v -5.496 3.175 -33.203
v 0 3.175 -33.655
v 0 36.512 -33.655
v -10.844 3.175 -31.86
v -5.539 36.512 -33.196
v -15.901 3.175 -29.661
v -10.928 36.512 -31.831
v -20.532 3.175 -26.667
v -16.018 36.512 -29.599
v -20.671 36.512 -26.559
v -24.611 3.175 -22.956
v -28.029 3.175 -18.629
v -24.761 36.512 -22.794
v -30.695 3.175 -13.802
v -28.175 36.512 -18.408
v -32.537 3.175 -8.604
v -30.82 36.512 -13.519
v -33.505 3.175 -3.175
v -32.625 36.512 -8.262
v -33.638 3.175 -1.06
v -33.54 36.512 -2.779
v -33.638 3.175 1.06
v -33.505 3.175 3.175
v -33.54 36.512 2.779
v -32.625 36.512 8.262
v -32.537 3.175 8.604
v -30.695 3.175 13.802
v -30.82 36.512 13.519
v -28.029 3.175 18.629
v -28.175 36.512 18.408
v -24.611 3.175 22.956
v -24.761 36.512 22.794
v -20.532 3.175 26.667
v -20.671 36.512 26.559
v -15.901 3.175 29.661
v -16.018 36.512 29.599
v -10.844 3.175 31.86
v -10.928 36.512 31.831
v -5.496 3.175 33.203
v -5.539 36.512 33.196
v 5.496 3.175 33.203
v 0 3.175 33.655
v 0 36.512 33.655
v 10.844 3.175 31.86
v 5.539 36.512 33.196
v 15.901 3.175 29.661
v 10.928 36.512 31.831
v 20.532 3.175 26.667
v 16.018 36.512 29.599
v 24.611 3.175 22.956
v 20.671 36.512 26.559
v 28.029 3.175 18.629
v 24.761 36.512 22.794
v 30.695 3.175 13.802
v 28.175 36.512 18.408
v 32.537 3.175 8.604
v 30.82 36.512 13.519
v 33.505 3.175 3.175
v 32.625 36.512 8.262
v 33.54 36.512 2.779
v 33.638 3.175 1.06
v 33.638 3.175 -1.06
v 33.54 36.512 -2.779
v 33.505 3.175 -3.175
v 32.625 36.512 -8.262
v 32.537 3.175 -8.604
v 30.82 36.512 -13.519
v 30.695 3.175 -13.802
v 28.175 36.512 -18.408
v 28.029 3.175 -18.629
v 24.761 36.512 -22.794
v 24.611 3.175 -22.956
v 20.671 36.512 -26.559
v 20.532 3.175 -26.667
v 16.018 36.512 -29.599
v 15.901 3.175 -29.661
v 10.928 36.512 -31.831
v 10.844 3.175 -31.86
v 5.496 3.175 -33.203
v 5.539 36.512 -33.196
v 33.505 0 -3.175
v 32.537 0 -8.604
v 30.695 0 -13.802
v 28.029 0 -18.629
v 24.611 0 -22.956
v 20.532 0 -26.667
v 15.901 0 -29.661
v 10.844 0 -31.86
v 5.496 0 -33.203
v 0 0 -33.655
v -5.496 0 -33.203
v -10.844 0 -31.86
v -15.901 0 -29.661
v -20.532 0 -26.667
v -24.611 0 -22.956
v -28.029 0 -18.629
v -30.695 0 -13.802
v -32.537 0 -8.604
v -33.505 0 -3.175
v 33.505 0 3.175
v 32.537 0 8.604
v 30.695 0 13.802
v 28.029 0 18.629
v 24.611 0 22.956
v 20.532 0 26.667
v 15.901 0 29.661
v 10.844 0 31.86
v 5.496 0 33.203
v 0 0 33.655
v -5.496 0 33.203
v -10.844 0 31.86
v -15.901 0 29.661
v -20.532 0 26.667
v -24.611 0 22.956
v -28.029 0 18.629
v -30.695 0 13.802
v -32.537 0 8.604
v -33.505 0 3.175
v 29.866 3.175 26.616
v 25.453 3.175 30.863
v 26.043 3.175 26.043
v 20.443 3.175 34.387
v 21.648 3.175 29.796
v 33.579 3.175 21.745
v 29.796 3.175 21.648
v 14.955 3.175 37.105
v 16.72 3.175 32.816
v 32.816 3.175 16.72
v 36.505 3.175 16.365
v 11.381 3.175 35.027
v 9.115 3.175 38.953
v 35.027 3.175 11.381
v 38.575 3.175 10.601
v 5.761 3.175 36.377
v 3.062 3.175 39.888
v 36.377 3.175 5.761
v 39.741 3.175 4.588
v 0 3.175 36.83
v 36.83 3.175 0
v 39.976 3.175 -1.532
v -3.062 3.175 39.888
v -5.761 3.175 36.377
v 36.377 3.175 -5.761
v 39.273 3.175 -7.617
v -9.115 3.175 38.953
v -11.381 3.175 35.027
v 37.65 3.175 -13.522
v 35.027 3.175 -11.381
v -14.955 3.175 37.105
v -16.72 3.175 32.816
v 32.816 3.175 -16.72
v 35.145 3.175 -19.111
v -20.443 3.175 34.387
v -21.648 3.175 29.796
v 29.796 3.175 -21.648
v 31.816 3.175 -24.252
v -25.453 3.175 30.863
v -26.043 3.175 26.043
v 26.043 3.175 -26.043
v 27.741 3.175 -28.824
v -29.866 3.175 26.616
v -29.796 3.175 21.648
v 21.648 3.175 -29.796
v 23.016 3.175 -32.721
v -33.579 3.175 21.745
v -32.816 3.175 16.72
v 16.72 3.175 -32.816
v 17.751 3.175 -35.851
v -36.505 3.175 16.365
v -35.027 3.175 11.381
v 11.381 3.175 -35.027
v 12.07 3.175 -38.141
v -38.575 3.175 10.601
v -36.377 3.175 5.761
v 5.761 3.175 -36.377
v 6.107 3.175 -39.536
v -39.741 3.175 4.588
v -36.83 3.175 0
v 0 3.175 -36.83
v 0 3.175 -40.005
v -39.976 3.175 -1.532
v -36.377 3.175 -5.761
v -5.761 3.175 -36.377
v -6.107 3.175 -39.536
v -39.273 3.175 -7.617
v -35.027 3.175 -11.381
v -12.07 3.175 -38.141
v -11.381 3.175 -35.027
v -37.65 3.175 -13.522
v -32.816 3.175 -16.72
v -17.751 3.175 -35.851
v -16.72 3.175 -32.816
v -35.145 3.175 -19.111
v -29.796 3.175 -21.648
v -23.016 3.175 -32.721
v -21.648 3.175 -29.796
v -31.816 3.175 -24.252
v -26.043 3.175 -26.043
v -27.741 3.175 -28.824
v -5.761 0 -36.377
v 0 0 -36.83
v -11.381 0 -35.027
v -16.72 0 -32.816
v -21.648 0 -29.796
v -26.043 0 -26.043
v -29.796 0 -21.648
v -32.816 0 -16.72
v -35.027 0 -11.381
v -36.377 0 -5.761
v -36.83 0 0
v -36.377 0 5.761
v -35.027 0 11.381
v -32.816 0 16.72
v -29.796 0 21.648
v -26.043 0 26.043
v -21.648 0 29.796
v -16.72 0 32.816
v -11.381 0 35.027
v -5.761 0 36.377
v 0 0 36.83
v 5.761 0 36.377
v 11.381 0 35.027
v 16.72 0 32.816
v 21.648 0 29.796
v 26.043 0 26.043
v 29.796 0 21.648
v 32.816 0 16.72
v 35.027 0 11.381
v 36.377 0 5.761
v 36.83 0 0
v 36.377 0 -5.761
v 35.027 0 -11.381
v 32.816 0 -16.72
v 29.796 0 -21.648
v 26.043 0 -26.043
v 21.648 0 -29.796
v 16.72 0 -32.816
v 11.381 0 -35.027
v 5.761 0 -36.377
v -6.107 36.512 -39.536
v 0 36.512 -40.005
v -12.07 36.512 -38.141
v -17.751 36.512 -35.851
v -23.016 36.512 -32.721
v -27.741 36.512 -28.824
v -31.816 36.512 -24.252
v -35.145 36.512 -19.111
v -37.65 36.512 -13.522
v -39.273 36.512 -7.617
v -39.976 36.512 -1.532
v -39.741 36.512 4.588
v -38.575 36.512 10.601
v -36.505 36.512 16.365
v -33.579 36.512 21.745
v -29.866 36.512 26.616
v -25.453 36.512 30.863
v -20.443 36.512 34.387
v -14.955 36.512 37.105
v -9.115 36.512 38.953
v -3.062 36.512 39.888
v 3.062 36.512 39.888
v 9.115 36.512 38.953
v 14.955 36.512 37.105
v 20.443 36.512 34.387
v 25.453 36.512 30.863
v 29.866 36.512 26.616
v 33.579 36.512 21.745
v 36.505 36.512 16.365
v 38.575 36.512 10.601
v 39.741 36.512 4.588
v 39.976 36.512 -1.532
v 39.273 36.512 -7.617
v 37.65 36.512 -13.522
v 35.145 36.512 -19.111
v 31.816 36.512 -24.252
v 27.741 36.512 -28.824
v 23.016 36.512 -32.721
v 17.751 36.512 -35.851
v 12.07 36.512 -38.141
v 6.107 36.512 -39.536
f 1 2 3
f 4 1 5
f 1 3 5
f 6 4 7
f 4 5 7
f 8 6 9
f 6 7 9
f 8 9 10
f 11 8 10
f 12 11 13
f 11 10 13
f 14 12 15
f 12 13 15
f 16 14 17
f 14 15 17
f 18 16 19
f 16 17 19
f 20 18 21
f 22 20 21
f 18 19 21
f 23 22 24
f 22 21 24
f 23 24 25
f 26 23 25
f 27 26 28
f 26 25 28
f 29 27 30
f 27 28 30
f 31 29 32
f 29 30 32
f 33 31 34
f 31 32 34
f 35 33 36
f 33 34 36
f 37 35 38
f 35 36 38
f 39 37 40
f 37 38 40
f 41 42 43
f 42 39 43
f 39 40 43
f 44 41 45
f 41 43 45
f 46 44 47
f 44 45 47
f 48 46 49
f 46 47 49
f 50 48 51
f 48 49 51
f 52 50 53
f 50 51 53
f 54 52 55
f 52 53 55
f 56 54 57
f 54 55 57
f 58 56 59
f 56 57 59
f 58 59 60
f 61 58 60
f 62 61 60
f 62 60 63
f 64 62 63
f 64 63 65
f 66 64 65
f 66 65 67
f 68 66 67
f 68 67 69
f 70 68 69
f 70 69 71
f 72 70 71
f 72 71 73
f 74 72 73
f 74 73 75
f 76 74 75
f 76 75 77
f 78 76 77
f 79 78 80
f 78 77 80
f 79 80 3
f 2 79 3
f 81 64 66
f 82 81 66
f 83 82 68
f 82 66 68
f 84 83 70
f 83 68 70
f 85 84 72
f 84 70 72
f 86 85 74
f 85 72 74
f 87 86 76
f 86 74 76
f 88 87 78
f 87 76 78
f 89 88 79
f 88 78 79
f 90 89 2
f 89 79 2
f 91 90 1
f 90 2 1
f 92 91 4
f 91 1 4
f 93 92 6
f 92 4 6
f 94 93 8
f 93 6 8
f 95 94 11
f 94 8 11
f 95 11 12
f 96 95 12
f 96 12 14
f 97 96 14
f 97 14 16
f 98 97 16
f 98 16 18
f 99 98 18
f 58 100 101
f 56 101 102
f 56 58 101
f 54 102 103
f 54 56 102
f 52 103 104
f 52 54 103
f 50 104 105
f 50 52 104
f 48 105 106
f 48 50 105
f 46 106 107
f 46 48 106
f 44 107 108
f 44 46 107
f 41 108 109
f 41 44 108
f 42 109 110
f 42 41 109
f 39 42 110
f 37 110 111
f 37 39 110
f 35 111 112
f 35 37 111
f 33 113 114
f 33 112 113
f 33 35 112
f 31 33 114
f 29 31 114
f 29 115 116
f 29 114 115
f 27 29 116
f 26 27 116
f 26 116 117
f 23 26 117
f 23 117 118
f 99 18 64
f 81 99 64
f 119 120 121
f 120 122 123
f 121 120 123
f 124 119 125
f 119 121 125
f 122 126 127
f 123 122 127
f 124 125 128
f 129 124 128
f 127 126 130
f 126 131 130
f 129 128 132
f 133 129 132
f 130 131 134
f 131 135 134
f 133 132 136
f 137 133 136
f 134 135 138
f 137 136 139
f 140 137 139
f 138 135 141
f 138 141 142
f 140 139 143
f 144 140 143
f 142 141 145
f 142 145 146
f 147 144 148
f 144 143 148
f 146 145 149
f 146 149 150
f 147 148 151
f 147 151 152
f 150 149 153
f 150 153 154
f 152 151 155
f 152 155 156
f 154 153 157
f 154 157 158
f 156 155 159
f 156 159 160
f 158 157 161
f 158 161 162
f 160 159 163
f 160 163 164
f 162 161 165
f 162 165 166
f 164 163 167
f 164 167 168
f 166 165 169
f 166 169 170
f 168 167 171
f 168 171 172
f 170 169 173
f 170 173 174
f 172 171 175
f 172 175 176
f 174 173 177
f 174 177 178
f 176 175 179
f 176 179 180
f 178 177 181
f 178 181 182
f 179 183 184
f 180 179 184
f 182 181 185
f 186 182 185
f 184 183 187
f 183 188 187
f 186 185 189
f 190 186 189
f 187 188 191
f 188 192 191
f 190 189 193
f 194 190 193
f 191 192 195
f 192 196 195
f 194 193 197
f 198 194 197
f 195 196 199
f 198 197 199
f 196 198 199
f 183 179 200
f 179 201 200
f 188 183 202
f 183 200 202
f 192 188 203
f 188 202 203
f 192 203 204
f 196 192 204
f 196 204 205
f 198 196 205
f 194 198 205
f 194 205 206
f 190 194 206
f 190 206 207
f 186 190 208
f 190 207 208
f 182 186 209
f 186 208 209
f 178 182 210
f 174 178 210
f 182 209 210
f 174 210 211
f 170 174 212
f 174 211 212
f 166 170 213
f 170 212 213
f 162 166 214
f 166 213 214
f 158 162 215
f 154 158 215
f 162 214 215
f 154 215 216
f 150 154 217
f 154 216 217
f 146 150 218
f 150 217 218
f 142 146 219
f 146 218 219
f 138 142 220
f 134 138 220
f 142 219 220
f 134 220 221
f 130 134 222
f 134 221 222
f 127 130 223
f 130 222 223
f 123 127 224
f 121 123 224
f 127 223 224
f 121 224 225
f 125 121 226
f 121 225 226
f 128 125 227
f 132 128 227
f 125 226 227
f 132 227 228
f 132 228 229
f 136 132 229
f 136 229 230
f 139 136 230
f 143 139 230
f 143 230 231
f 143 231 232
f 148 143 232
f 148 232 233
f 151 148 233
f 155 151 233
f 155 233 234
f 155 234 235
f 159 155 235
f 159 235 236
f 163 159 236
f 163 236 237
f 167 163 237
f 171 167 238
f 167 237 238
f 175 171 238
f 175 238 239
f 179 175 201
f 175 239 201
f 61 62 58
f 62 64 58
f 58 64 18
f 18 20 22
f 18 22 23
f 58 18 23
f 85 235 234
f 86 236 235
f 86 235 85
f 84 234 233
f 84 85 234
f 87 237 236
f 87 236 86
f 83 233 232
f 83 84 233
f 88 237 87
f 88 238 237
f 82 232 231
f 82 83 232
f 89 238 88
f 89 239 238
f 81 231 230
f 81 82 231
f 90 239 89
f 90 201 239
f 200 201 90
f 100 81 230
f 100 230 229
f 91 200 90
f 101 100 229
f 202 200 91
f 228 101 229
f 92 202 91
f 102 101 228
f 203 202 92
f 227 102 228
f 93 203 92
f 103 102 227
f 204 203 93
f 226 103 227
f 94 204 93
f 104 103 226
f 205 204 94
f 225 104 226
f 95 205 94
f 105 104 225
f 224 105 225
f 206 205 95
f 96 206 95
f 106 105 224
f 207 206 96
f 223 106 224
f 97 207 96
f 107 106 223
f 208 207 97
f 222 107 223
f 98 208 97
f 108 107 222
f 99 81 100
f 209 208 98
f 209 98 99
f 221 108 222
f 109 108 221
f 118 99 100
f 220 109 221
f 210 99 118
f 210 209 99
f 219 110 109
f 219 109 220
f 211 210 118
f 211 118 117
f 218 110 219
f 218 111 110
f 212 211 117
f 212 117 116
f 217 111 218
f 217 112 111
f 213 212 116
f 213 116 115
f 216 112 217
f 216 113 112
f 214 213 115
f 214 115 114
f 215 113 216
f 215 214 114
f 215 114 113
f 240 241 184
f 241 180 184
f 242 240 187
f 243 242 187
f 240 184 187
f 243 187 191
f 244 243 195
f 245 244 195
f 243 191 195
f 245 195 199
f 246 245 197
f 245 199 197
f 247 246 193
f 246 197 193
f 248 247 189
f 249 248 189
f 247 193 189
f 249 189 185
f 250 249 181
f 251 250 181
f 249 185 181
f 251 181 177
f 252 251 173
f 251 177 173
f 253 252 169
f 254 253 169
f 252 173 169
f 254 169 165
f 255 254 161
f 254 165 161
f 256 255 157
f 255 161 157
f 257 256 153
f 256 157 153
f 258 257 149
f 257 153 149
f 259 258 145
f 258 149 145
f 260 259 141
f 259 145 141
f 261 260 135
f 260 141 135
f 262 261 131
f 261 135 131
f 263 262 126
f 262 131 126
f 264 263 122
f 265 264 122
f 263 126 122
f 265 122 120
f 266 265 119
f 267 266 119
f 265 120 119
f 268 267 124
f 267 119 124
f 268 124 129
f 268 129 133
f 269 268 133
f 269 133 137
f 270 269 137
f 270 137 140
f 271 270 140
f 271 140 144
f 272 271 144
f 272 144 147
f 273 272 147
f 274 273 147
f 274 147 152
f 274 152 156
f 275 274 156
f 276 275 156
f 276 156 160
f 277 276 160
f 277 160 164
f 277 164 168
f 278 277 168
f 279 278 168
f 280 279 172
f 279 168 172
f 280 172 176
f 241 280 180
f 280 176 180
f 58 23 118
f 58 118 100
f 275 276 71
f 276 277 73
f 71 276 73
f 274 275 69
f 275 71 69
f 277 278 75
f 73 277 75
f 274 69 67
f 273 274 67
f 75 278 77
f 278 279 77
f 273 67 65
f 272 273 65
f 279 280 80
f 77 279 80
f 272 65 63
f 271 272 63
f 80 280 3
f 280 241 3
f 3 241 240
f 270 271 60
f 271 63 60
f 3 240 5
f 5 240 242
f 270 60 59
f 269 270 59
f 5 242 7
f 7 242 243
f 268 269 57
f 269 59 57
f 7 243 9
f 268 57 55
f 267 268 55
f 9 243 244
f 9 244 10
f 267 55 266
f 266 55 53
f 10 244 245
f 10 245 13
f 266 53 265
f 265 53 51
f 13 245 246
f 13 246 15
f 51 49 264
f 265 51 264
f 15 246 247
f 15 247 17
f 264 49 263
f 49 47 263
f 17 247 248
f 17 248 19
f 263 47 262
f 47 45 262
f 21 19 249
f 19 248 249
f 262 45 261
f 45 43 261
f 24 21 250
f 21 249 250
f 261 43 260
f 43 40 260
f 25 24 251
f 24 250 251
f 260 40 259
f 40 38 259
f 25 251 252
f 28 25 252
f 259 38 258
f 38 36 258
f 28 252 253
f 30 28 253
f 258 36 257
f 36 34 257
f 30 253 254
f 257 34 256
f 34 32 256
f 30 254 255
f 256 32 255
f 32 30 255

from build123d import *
from build123d.topology import SkipClean

# Parameters (mm, degrees)
CUT_EXTRUDE1_DEPTH = 66.667259393


with BuildPart() as part:
    # Sketch1 → Revolve1 (revolve)
    with BuildSketch(Plane.XY, mode=Mode.PRIVATE) as revolve1_sk:
        Polygon((33.655, 36.5125), (40.005, 36.5125), (40.005, 3.175), (36.83, 3.175), (36.83, 0), (33.655, 0), (0, 0), (0, 3.175), (33.655, 3.175), align=None)
    revolve(revolve1_sk.sketch.rotate(Axis((0, 0, 0), (0, 1, 0)), 90), axis=Axis((0, 0, 0), (0, 1, 0)))

    # Sketch2 → Cut-Extrude1 (cut, through all)
    with SkipClean():  # the faces are left unmerged after this step: merging them gives an invalid solid
        with BuildSketch(Plane(origin=(0, 3.175, 0), x_dir=(1, 0, 0), z_dir=(0, 1, 0))):
            with BuildLine():
                Line((-33.504901134, 3.175), (33.504901134, 3.175))
                ThreePointArc((33.504901134, 3.175), (0, 33.655), (-33.504901134, 3.175))
            make_face()
            with BuildLine():
                Line((-33.504901134, -3.175), (33.504901134, -3.175))
                ThreePointArc((33.504901134, -3.175), (0, -33.655), (-33.504901134, -3.175))
            make_face()
        extrude(amount=-CUT_EXTRUDE1_DEPTH, mode=Mode.SUBTRACT)


solid = part.part
